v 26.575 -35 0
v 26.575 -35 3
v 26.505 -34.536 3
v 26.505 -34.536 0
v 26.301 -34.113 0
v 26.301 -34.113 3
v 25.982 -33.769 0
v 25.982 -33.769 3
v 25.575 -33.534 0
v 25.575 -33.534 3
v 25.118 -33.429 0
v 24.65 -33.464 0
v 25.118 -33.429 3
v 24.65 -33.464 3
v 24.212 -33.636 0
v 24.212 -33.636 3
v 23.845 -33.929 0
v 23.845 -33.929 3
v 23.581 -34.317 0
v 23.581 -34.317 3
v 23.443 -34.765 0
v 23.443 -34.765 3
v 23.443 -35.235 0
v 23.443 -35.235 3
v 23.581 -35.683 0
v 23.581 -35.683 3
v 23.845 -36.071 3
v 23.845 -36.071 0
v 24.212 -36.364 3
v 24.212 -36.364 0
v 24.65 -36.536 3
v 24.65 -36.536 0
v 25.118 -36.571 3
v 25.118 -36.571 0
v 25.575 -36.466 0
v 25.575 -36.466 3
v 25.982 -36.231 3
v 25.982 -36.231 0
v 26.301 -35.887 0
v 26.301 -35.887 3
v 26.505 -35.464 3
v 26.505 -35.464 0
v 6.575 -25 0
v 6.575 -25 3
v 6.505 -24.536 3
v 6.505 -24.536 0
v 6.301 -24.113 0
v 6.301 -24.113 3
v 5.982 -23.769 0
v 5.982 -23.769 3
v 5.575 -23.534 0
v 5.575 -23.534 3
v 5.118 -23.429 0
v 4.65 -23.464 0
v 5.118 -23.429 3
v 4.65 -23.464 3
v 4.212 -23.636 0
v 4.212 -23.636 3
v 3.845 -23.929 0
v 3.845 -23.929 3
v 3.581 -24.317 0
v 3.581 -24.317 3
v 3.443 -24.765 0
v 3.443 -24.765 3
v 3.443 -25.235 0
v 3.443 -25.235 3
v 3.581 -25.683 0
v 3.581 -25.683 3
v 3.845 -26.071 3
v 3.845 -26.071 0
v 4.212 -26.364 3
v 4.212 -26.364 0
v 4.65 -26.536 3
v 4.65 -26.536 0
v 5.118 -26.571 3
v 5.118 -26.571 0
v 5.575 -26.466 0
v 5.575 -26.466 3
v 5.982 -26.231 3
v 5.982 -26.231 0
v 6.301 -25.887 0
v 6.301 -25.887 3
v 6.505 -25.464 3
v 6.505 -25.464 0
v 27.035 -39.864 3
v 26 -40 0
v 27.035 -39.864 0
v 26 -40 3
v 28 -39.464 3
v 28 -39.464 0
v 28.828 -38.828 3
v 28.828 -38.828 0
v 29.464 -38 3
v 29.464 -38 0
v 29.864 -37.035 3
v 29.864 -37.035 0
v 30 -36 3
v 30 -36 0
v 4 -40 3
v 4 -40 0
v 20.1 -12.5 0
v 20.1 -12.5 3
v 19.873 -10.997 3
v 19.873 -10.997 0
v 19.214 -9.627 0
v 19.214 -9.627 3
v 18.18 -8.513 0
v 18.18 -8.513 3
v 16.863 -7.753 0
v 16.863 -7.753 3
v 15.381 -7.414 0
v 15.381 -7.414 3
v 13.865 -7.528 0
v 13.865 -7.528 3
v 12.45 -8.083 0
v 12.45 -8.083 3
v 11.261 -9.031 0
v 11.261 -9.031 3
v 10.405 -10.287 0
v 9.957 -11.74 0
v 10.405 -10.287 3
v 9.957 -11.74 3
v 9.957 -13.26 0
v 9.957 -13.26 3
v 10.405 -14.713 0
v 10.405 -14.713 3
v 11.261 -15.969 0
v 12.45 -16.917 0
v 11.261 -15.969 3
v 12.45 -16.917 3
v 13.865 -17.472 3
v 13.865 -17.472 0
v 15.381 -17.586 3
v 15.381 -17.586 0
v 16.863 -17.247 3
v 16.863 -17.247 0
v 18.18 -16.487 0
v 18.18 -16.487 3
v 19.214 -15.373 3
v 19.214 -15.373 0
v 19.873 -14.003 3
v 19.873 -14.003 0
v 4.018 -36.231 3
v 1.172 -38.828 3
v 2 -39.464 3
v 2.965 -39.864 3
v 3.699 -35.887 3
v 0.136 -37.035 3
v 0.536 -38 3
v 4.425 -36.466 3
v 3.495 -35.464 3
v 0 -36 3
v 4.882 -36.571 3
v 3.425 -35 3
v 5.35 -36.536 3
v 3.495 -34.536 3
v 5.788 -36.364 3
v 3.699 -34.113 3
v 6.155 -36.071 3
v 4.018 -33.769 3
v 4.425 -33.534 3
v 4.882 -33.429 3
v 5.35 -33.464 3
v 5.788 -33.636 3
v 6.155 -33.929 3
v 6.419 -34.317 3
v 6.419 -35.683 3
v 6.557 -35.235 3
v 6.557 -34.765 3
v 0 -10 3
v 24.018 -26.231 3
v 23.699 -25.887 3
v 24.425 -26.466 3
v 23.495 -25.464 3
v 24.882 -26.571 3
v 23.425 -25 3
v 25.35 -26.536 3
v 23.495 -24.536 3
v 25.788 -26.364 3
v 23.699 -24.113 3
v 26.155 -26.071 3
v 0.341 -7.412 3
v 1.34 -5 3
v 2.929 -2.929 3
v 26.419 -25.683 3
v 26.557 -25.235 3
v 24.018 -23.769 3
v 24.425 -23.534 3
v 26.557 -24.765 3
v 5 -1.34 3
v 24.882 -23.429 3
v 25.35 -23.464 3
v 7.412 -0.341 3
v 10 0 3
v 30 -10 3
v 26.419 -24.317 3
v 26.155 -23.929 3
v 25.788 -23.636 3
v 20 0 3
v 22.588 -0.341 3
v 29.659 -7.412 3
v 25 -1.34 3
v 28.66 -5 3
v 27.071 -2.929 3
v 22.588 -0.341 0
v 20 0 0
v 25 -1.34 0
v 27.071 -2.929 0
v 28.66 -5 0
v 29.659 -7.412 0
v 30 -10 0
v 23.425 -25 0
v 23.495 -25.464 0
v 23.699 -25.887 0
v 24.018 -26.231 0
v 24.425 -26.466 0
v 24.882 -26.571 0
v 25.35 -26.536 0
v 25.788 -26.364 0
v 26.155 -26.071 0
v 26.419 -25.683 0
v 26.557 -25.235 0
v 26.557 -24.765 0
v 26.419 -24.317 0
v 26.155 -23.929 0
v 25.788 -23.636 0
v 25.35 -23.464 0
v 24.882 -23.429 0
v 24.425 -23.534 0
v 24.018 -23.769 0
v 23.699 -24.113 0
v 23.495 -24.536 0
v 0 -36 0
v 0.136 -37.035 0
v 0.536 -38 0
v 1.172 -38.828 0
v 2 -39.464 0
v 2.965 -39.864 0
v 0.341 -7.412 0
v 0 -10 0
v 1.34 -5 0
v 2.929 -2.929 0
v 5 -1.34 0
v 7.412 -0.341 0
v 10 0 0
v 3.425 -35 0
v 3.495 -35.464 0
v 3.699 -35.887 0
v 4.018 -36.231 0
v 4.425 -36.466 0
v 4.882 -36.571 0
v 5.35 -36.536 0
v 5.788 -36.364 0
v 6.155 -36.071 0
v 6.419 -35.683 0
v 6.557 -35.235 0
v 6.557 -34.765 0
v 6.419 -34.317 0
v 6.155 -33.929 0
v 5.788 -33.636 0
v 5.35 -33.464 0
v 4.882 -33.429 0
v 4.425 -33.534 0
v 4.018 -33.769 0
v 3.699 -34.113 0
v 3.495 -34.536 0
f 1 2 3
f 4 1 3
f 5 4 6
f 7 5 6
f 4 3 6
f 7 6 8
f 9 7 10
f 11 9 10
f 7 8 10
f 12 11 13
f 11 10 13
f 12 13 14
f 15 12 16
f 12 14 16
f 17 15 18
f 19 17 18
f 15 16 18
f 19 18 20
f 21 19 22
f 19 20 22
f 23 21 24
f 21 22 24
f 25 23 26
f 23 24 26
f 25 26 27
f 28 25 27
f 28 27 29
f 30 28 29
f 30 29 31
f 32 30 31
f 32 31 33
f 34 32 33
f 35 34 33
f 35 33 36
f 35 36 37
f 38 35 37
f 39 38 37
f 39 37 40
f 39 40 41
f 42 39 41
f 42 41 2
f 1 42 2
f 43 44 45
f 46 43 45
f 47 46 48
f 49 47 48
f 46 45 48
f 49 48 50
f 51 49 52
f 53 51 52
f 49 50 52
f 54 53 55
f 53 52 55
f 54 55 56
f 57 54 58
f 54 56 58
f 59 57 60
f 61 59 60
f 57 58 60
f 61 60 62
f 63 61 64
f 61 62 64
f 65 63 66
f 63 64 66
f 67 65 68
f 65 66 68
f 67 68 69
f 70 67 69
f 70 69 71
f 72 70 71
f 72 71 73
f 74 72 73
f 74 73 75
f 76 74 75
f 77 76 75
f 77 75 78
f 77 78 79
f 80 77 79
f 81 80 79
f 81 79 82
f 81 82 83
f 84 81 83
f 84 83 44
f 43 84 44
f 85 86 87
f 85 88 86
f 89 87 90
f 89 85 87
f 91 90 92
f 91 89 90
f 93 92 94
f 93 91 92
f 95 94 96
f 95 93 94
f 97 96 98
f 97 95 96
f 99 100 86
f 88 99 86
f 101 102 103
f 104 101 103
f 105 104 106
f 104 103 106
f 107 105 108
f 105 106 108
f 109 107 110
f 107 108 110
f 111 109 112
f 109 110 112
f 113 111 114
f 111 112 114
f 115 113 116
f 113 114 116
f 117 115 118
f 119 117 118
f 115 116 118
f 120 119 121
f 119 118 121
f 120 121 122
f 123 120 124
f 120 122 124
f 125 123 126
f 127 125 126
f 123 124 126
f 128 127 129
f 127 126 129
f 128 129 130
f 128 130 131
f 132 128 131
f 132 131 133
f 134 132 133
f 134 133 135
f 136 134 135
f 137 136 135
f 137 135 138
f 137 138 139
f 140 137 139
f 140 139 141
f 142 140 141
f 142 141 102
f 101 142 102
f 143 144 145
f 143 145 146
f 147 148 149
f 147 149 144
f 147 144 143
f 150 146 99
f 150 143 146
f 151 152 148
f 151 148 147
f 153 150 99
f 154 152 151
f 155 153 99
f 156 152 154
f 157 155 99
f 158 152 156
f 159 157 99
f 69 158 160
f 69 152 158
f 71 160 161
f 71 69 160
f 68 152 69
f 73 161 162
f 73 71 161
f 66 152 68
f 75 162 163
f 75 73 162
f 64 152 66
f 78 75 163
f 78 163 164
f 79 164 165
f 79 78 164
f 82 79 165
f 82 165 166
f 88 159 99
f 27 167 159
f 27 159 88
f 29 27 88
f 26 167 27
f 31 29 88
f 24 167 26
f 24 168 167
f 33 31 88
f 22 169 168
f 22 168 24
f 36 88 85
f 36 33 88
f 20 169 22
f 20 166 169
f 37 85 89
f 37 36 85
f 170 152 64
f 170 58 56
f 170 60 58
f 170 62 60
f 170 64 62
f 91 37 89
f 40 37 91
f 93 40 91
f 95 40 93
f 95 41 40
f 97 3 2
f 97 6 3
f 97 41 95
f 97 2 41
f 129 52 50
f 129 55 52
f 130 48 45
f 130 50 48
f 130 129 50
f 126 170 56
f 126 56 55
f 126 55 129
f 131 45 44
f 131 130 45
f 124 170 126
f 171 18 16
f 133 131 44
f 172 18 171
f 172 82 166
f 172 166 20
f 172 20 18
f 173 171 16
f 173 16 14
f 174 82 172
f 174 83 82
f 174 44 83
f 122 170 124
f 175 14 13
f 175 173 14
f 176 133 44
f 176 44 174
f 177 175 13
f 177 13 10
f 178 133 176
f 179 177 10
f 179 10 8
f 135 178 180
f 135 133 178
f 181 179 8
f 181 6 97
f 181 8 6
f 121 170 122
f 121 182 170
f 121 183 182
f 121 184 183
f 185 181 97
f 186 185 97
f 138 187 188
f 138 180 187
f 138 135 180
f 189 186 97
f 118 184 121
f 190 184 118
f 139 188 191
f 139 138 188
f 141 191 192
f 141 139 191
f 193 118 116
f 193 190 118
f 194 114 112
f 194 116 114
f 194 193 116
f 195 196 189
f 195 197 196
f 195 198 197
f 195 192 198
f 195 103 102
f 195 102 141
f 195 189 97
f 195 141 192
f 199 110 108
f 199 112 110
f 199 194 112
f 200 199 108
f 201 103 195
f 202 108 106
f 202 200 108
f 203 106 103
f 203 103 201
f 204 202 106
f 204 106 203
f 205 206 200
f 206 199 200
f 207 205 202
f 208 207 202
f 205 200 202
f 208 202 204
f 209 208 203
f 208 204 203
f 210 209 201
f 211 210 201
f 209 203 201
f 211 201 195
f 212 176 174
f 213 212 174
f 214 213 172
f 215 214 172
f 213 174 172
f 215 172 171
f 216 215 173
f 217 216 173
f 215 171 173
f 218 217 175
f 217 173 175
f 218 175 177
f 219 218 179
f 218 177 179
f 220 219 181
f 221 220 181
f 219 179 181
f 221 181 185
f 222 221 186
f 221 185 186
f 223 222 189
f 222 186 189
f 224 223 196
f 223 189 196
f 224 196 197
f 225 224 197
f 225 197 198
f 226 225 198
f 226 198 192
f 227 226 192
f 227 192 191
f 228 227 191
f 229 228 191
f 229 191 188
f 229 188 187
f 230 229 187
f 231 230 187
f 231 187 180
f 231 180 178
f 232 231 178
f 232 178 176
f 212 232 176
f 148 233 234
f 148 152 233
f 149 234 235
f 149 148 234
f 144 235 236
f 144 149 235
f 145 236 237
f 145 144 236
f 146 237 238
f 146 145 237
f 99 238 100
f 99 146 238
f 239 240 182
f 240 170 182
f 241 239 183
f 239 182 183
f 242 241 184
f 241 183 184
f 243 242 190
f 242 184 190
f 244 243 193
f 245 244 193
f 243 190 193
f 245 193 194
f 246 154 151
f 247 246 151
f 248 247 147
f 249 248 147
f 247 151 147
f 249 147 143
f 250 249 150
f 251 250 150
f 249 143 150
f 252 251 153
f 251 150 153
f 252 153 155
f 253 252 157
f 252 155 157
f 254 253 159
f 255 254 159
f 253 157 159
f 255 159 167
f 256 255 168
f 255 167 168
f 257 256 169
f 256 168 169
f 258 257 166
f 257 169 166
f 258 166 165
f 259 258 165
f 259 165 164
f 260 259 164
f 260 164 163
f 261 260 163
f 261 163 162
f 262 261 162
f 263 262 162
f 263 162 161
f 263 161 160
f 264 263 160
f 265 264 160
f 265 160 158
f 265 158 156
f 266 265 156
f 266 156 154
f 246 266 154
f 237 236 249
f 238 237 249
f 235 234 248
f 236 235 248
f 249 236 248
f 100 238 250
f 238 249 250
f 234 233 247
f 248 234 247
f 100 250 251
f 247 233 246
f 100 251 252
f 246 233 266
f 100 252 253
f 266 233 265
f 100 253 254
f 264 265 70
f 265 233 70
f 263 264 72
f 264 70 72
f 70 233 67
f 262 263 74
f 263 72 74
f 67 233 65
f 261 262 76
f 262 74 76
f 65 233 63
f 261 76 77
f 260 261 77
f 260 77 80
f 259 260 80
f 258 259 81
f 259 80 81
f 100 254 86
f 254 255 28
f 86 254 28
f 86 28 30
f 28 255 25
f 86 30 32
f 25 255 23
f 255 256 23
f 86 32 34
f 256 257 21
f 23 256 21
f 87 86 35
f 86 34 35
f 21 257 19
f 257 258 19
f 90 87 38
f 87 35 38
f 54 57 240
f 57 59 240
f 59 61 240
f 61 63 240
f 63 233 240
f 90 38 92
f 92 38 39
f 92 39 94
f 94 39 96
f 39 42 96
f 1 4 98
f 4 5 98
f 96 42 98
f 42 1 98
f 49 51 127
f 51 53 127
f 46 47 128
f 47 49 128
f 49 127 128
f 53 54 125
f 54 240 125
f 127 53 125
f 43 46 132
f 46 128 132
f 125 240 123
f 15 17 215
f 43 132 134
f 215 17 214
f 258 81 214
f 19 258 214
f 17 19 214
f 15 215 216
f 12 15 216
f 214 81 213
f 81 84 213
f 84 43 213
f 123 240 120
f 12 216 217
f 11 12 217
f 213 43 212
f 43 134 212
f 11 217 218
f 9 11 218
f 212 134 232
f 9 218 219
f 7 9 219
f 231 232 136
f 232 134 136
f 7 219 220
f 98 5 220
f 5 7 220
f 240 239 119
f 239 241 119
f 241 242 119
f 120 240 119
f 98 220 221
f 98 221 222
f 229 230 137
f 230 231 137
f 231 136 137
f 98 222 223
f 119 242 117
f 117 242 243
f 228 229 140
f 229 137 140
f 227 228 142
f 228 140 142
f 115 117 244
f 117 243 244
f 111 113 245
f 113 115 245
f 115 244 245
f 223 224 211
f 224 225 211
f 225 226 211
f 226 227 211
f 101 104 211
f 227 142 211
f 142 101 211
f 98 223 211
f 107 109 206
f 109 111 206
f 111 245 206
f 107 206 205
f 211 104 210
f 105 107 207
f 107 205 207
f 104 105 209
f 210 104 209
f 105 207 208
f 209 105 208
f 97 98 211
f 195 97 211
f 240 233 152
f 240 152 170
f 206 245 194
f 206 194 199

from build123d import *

# Parameters (mm, degrees)
SKETCH_1_W          = 30
SKETCH_1_H          = 40
EXTRUDE_1_DEPTH     = 3
SKETCH_2_R          = 5.1
SKETCH_2_R_2        = 1.575
CUT_EXTRUDE_1_DEPTH = 51.089919145
FILLET_1_R          = 10
FILLET_2_R          = 4


with BuildPart() as part:
    # 草图1 → 凸台-拉伸1 (new body)
    with BuildSketch(Plane.XY):
        with Locations((15, -20)):
            Rectangle(SKETCH_1_W, SKETCH_1_H)
    extrude(amount=EXTRUDE_1_DEPTH)

    # 草图2 → 切除-拉伸1 (cut, through all)
    with BuildSketch(Plane.XY.offset(3)):
        with Locations((15, -12.5)):
            Circle(SKETCH_2_R)
        with Locations((5, -25)):
            Circle(SKETCH_2_R_2)
        with Locations(Location((5, -35, 0), (0, 0, 180))):
            Circle(SKETCH_2_R_2)
        with Locations((25, -35)):
            Circle(SKETCH_2_R_2)
        with Locations(Location((25, -25, 0), (0, 0, 180))):
            Circle(SKETCH_2_R_2)
    extrude(amount=-CUT_EXTRUDE_1_DEPTH, mode=Mode.SUBTRACT)

    # 圆角1
    fillet_1_edges = [part.edges().sort_by_distance(p)[0] for p in [
        (0, 0, 1.5),
        (30, 0, 1.5),
    ]]
    fillet(fillet_1_edges, radius=FILLET_1_R)

    # 圆角2
    fillet_2_edges = [part.edges().sort_by_distance(p)[0] for p in [
        (30, -40, 1.5),
        (0, -40, 1.5),
    ]]
    fillet(fillet_2_edges, radius=FILLET_2_R)


solid = part.part
